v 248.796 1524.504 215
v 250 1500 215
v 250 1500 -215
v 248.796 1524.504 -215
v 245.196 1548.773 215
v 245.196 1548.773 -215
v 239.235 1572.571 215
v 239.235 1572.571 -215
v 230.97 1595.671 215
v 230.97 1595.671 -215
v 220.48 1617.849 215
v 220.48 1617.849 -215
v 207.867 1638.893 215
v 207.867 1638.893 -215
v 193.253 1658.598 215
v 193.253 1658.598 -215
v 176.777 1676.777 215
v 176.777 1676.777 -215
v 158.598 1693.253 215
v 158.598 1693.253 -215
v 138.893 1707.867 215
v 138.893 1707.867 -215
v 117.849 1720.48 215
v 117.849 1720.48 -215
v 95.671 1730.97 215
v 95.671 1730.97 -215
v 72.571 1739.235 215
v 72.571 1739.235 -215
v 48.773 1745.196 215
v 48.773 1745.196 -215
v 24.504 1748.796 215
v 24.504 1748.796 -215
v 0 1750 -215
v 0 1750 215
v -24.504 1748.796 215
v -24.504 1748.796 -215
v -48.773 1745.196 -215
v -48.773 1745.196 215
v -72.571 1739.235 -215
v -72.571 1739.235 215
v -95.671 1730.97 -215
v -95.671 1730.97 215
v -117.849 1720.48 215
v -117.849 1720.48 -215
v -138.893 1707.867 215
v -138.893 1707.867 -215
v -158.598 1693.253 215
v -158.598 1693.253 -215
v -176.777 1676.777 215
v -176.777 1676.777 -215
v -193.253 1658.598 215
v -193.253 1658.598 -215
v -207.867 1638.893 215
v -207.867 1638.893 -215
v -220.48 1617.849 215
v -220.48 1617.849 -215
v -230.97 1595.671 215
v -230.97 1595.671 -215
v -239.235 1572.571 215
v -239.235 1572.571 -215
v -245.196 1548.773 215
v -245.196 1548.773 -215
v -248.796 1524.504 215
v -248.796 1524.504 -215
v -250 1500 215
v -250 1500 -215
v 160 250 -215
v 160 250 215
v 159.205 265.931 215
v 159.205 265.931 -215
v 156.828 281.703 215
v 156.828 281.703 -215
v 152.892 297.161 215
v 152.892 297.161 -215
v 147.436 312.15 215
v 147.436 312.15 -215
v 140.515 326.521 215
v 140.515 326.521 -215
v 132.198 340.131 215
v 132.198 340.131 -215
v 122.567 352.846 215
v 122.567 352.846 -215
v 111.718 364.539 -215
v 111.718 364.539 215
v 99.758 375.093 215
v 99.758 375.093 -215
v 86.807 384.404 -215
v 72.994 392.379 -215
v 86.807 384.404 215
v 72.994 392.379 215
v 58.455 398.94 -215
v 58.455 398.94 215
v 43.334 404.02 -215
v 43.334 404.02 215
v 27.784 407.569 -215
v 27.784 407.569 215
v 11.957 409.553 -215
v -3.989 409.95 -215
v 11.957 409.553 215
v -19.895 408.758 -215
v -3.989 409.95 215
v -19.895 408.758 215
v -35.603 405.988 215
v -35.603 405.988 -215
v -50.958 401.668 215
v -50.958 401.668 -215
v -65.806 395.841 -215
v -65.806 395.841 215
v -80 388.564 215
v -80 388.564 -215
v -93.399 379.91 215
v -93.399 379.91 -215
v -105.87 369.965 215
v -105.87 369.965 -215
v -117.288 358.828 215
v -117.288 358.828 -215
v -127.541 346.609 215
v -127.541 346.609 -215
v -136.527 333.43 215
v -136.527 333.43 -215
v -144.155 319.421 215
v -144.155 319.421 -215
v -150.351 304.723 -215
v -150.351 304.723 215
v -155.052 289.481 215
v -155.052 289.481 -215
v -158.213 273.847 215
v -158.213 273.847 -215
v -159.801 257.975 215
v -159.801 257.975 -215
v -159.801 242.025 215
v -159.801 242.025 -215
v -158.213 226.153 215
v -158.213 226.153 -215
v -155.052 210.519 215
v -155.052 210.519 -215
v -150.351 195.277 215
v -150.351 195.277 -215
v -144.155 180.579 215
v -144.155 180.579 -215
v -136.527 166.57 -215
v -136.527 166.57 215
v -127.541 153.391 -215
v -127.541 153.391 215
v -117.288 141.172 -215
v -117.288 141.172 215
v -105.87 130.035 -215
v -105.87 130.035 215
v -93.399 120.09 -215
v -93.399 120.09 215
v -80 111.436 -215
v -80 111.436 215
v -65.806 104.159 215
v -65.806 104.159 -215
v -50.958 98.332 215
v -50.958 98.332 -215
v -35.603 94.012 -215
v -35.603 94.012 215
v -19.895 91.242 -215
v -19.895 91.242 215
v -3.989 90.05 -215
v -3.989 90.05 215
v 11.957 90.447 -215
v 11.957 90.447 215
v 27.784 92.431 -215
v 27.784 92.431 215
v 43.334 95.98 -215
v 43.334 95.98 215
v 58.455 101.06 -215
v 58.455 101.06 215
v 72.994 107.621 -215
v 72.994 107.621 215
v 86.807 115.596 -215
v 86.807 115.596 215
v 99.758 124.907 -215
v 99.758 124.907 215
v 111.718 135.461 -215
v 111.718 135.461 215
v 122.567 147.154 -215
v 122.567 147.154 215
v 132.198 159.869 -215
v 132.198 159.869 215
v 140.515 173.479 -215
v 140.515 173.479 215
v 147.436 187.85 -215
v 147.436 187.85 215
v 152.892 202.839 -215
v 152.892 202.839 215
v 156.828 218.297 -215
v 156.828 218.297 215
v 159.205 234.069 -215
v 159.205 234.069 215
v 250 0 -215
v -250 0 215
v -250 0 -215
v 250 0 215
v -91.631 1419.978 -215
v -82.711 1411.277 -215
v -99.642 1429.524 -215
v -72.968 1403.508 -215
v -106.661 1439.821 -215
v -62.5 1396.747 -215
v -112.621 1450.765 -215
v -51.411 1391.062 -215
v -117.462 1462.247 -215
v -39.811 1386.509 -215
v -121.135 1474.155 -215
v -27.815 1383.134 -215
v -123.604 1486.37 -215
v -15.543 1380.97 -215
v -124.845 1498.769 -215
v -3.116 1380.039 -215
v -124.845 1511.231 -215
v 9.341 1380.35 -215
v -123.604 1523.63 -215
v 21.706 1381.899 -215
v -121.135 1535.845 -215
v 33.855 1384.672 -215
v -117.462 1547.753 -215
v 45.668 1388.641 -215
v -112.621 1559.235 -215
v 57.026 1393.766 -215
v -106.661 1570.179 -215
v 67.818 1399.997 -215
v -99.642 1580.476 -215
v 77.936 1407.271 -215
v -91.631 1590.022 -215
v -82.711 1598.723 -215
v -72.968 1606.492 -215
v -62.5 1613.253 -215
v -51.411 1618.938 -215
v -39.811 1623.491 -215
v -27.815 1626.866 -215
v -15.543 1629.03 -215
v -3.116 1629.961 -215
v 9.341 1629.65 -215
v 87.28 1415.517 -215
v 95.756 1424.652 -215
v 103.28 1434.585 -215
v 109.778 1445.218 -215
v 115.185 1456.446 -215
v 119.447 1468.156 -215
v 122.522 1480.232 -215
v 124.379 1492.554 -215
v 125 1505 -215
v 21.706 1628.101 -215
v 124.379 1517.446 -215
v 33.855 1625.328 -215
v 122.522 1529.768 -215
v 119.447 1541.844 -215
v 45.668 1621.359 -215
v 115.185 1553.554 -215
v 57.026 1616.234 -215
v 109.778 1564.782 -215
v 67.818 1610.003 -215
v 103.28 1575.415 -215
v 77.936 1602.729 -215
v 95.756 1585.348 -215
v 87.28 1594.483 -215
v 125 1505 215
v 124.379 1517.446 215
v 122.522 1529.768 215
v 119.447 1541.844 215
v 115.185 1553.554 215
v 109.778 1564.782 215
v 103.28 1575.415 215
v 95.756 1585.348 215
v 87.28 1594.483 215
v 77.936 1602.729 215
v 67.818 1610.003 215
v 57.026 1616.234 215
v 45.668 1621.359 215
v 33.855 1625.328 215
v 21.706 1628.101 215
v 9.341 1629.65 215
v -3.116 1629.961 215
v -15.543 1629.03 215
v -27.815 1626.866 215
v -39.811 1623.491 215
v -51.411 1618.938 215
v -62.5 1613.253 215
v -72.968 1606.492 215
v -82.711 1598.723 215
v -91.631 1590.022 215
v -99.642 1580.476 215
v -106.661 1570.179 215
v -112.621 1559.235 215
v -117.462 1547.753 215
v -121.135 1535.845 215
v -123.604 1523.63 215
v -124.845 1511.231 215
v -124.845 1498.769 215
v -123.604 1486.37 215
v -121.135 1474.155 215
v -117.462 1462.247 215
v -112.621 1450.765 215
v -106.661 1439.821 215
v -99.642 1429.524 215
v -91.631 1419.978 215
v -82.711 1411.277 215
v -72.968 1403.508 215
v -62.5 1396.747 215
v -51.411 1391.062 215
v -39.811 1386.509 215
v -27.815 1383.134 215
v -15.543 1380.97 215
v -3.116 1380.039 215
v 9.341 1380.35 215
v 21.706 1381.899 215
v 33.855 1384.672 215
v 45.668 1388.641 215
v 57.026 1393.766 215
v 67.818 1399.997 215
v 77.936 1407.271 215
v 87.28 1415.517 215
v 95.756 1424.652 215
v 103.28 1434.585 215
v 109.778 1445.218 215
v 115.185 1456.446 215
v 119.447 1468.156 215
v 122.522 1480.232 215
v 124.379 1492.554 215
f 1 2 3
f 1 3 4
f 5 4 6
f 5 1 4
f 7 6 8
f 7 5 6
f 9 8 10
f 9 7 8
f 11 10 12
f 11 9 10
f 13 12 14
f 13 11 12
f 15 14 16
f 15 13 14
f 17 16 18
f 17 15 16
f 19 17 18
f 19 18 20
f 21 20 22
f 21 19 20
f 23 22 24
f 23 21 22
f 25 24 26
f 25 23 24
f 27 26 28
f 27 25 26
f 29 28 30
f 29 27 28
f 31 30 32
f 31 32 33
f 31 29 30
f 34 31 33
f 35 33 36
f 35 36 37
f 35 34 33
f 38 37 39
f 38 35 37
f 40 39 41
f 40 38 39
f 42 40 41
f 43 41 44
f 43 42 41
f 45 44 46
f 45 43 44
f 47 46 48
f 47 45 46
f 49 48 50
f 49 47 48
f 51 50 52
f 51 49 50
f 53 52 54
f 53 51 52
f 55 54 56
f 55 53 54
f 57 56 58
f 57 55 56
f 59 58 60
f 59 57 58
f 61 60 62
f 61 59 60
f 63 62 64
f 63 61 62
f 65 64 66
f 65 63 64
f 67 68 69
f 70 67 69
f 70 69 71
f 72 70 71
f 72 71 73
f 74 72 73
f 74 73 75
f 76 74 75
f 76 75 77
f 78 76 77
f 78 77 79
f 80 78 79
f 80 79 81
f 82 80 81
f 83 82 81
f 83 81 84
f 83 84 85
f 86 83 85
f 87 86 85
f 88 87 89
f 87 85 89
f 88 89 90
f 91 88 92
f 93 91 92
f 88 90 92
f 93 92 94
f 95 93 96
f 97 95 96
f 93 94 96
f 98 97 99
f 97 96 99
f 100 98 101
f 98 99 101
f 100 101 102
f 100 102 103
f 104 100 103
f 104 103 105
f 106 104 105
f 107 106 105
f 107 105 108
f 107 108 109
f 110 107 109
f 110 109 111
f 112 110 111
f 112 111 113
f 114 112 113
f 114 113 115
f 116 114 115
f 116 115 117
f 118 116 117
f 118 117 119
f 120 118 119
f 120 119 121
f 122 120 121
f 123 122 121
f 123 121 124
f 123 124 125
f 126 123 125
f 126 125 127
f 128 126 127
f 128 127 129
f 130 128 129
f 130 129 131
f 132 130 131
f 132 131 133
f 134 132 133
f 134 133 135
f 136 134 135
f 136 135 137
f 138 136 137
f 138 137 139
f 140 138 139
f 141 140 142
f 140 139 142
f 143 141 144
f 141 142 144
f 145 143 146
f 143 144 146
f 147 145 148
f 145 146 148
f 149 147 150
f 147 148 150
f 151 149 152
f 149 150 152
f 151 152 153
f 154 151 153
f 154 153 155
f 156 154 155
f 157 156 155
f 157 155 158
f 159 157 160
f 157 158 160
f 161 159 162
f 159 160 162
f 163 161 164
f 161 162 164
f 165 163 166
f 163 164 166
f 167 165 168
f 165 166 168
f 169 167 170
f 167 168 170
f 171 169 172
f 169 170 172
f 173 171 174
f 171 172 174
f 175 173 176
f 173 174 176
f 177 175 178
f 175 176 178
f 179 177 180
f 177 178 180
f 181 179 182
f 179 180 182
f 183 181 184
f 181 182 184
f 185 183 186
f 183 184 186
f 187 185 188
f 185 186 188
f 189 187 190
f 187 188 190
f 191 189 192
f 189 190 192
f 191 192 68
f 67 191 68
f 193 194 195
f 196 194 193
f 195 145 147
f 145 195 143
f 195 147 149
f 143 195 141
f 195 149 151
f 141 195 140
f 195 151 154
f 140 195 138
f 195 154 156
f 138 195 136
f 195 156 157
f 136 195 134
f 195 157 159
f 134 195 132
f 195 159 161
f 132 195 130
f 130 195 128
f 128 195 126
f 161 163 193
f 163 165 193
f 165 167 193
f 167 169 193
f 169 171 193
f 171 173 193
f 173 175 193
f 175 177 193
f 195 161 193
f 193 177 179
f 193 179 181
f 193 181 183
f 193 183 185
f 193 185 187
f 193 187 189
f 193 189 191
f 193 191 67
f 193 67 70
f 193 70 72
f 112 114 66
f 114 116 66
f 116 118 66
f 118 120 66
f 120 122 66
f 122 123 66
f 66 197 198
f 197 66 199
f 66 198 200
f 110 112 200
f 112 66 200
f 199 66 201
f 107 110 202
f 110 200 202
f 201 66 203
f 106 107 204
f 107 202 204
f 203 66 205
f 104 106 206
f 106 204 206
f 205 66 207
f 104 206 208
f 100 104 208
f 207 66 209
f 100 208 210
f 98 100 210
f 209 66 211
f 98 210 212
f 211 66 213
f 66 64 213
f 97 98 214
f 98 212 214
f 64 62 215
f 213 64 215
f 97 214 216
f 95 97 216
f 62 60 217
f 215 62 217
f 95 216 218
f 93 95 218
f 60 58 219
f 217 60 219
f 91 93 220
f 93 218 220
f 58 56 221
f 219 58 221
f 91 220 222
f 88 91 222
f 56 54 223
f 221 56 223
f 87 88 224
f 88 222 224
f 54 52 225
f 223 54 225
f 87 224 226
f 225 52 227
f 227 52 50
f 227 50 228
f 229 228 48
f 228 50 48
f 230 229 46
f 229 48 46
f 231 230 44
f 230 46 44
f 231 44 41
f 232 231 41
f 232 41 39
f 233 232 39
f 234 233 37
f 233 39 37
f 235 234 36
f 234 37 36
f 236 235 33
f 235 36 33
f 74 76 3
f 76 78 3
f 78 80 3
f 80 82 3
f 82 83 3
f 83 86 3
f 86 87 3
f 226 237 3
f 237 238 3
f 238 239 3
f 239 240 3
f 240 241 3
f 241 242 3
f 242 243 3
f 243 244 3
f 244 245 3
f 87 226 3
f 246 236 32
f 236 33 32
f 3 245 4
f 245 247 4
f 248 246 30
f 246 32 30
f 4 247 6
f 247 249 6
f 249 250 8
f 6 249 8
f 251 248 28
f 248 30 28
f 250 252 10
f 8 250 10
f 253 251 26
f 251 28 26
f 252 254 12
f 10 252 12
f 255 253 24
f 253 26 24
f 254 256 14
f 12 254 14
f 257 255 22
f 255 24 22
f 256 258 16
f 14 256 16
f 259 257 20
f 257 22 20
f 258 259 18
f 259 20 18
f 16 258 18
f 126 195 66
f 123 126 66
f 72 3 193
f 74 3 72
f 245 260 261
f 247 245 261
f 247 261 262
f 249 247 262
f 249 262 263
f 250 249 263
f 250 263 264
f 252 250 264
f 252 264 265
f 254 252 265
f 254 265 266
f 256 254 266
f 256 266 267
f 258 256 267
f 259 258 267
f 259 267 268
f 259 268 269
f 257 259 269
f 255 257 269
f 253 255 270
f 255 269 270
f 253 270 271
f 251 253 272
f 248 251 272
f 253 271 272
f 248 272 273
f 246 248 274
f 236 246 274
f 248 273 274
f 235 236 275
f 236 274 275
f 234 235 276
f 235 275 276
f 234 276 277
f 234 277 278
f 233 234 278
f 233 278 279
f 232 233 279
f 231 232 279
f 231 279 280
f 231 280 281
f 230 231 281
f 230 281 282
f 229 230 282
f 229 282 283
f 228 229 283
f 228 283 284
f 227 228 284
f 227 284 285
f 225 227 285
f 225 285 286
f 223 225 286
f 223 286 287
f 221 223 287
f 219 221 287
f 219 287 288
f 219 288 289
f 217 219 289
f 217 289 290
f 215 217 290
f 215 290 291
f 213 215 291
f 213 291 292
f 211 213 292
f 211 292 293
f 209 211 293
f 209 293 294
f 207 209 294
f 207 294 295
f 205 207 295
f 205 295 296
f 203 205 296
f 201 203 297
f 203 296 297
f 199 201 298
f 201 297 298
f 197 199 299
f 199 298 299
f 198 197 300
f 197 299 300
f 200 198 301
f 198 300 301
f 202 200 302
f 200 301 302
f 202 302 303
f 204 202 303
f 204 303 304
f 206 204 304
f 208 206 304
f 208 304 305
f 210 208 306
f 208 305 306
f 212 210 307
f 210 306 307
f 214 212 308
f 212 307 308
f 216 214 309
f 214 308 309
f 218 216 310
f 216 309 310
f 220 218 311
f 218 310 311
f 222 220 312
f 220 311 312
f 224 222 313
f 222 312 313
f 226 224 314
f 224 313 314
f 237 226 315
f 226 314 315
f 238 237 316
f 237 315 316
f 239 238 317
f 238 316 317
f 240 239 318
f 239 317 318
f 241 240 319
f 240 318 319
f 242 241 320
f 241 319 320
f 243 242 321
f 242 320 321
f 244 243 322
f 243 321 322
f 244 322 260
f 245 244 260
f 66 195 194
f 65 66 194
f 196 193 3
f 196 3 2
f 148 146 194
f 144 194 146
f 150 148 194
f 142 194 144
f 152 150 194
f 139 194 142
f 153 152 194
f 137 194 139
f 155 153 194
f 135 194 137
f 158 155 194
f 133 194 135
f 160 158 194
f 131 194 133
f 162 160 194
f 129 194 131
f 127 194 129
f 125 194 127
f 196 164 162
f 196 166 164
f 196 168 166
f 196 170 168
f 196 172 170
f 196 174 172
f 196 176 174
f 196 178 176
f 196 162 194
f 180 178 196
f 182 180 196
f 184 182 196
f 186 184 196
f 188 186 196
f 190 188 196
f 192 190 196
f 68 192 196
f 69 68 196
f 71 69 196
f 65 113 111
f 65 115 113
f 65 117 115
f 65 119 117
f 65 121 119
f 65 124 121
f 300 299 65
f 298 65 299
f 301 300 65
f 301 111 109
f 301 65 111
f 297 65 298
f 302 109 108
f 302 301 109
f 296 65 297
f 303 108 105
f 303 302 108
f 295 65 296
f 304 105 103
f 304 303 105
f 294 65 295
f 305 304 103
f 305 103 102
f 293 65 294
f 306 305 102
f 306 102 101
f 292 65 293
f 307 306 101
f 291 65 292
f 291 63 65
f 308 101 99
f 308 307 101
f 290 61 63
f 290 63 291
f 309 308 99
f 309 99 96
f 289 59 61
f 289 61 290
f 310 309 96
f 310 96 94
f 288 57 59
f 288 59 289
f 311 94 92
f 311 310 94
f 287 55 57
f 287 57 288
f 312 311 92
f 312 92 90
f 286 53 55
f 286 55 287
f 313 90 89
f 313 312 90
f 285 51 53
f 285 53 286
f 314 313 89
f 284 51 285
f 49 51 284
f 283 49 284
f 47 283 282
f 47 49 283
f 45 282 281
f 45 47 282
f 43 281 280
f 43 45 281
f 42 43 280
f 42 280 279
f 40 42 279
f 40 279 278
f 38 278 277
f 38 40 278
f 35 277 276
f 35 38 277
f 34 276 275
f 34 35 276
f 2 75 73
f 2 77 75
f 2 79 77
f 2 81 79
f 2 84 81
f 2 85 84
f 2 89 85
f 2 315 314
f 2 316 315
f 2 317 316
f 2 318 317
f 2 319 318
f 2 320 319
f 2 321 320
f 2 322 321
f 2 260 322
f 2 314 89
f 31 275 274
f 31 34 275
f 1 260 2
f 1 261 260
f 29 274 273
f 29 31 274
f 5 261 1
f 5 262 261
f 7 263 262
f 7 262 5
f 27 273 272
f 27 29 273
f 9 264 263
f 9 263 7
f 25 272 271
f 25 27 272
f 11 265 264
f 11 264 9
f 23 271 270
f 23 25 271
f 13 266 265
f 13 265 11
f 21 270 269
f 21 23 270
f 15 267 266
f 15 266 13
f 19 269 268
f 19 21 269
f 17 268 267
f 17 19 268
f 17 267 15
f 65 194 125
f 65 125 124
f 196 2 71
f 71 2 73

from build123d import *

# Parameters (mm, degrees)
F0_W     = 500
F0_H     = 430
F1_DEPTH = 1500
F3_DEPTH = 430
F4_R     = 125
F5_DEPTH = 500
F6_R     = 160
F7_DEPTH = 500


with BuildPart() as f1:
    # F0 (on Front) → F1 (new body)
    with BuildSketch(Plane.XZ):
        Rectangle(F0_W, F0_H)
    extrude(amount=-F1_DEPTH)

    # F2 (on face) → F3 (join)
    with BuildSketch(Plane.XY.offset(215)):
        with BuildLine():
            Line((-250, 1500), (250, 1500))
            ThreePointArc((250, 1500), (0, 1750), (-250, 1500))
        make_face()
    extrude(amount=-F3_DEPTH)

    # F4 (on face) → F5 (cut)
    with BuildSketch(Plane.XY.offset(215)):
        with Locations((0, 1505)):
            Circle(F4_R)
    extrude(amount=-F5_DEPTH, mode=Mode.SUBTRACT)

    # F6 (on face) → F7 (cut)
    with BuildSketch(Plane.XY.offset(215)):
        with Locations((0, 250)):
            Circle(F6_R)
    extrude(amount=-F7_DEPTH, mode=Mode.SUBTRACT)


solid = f1.part
